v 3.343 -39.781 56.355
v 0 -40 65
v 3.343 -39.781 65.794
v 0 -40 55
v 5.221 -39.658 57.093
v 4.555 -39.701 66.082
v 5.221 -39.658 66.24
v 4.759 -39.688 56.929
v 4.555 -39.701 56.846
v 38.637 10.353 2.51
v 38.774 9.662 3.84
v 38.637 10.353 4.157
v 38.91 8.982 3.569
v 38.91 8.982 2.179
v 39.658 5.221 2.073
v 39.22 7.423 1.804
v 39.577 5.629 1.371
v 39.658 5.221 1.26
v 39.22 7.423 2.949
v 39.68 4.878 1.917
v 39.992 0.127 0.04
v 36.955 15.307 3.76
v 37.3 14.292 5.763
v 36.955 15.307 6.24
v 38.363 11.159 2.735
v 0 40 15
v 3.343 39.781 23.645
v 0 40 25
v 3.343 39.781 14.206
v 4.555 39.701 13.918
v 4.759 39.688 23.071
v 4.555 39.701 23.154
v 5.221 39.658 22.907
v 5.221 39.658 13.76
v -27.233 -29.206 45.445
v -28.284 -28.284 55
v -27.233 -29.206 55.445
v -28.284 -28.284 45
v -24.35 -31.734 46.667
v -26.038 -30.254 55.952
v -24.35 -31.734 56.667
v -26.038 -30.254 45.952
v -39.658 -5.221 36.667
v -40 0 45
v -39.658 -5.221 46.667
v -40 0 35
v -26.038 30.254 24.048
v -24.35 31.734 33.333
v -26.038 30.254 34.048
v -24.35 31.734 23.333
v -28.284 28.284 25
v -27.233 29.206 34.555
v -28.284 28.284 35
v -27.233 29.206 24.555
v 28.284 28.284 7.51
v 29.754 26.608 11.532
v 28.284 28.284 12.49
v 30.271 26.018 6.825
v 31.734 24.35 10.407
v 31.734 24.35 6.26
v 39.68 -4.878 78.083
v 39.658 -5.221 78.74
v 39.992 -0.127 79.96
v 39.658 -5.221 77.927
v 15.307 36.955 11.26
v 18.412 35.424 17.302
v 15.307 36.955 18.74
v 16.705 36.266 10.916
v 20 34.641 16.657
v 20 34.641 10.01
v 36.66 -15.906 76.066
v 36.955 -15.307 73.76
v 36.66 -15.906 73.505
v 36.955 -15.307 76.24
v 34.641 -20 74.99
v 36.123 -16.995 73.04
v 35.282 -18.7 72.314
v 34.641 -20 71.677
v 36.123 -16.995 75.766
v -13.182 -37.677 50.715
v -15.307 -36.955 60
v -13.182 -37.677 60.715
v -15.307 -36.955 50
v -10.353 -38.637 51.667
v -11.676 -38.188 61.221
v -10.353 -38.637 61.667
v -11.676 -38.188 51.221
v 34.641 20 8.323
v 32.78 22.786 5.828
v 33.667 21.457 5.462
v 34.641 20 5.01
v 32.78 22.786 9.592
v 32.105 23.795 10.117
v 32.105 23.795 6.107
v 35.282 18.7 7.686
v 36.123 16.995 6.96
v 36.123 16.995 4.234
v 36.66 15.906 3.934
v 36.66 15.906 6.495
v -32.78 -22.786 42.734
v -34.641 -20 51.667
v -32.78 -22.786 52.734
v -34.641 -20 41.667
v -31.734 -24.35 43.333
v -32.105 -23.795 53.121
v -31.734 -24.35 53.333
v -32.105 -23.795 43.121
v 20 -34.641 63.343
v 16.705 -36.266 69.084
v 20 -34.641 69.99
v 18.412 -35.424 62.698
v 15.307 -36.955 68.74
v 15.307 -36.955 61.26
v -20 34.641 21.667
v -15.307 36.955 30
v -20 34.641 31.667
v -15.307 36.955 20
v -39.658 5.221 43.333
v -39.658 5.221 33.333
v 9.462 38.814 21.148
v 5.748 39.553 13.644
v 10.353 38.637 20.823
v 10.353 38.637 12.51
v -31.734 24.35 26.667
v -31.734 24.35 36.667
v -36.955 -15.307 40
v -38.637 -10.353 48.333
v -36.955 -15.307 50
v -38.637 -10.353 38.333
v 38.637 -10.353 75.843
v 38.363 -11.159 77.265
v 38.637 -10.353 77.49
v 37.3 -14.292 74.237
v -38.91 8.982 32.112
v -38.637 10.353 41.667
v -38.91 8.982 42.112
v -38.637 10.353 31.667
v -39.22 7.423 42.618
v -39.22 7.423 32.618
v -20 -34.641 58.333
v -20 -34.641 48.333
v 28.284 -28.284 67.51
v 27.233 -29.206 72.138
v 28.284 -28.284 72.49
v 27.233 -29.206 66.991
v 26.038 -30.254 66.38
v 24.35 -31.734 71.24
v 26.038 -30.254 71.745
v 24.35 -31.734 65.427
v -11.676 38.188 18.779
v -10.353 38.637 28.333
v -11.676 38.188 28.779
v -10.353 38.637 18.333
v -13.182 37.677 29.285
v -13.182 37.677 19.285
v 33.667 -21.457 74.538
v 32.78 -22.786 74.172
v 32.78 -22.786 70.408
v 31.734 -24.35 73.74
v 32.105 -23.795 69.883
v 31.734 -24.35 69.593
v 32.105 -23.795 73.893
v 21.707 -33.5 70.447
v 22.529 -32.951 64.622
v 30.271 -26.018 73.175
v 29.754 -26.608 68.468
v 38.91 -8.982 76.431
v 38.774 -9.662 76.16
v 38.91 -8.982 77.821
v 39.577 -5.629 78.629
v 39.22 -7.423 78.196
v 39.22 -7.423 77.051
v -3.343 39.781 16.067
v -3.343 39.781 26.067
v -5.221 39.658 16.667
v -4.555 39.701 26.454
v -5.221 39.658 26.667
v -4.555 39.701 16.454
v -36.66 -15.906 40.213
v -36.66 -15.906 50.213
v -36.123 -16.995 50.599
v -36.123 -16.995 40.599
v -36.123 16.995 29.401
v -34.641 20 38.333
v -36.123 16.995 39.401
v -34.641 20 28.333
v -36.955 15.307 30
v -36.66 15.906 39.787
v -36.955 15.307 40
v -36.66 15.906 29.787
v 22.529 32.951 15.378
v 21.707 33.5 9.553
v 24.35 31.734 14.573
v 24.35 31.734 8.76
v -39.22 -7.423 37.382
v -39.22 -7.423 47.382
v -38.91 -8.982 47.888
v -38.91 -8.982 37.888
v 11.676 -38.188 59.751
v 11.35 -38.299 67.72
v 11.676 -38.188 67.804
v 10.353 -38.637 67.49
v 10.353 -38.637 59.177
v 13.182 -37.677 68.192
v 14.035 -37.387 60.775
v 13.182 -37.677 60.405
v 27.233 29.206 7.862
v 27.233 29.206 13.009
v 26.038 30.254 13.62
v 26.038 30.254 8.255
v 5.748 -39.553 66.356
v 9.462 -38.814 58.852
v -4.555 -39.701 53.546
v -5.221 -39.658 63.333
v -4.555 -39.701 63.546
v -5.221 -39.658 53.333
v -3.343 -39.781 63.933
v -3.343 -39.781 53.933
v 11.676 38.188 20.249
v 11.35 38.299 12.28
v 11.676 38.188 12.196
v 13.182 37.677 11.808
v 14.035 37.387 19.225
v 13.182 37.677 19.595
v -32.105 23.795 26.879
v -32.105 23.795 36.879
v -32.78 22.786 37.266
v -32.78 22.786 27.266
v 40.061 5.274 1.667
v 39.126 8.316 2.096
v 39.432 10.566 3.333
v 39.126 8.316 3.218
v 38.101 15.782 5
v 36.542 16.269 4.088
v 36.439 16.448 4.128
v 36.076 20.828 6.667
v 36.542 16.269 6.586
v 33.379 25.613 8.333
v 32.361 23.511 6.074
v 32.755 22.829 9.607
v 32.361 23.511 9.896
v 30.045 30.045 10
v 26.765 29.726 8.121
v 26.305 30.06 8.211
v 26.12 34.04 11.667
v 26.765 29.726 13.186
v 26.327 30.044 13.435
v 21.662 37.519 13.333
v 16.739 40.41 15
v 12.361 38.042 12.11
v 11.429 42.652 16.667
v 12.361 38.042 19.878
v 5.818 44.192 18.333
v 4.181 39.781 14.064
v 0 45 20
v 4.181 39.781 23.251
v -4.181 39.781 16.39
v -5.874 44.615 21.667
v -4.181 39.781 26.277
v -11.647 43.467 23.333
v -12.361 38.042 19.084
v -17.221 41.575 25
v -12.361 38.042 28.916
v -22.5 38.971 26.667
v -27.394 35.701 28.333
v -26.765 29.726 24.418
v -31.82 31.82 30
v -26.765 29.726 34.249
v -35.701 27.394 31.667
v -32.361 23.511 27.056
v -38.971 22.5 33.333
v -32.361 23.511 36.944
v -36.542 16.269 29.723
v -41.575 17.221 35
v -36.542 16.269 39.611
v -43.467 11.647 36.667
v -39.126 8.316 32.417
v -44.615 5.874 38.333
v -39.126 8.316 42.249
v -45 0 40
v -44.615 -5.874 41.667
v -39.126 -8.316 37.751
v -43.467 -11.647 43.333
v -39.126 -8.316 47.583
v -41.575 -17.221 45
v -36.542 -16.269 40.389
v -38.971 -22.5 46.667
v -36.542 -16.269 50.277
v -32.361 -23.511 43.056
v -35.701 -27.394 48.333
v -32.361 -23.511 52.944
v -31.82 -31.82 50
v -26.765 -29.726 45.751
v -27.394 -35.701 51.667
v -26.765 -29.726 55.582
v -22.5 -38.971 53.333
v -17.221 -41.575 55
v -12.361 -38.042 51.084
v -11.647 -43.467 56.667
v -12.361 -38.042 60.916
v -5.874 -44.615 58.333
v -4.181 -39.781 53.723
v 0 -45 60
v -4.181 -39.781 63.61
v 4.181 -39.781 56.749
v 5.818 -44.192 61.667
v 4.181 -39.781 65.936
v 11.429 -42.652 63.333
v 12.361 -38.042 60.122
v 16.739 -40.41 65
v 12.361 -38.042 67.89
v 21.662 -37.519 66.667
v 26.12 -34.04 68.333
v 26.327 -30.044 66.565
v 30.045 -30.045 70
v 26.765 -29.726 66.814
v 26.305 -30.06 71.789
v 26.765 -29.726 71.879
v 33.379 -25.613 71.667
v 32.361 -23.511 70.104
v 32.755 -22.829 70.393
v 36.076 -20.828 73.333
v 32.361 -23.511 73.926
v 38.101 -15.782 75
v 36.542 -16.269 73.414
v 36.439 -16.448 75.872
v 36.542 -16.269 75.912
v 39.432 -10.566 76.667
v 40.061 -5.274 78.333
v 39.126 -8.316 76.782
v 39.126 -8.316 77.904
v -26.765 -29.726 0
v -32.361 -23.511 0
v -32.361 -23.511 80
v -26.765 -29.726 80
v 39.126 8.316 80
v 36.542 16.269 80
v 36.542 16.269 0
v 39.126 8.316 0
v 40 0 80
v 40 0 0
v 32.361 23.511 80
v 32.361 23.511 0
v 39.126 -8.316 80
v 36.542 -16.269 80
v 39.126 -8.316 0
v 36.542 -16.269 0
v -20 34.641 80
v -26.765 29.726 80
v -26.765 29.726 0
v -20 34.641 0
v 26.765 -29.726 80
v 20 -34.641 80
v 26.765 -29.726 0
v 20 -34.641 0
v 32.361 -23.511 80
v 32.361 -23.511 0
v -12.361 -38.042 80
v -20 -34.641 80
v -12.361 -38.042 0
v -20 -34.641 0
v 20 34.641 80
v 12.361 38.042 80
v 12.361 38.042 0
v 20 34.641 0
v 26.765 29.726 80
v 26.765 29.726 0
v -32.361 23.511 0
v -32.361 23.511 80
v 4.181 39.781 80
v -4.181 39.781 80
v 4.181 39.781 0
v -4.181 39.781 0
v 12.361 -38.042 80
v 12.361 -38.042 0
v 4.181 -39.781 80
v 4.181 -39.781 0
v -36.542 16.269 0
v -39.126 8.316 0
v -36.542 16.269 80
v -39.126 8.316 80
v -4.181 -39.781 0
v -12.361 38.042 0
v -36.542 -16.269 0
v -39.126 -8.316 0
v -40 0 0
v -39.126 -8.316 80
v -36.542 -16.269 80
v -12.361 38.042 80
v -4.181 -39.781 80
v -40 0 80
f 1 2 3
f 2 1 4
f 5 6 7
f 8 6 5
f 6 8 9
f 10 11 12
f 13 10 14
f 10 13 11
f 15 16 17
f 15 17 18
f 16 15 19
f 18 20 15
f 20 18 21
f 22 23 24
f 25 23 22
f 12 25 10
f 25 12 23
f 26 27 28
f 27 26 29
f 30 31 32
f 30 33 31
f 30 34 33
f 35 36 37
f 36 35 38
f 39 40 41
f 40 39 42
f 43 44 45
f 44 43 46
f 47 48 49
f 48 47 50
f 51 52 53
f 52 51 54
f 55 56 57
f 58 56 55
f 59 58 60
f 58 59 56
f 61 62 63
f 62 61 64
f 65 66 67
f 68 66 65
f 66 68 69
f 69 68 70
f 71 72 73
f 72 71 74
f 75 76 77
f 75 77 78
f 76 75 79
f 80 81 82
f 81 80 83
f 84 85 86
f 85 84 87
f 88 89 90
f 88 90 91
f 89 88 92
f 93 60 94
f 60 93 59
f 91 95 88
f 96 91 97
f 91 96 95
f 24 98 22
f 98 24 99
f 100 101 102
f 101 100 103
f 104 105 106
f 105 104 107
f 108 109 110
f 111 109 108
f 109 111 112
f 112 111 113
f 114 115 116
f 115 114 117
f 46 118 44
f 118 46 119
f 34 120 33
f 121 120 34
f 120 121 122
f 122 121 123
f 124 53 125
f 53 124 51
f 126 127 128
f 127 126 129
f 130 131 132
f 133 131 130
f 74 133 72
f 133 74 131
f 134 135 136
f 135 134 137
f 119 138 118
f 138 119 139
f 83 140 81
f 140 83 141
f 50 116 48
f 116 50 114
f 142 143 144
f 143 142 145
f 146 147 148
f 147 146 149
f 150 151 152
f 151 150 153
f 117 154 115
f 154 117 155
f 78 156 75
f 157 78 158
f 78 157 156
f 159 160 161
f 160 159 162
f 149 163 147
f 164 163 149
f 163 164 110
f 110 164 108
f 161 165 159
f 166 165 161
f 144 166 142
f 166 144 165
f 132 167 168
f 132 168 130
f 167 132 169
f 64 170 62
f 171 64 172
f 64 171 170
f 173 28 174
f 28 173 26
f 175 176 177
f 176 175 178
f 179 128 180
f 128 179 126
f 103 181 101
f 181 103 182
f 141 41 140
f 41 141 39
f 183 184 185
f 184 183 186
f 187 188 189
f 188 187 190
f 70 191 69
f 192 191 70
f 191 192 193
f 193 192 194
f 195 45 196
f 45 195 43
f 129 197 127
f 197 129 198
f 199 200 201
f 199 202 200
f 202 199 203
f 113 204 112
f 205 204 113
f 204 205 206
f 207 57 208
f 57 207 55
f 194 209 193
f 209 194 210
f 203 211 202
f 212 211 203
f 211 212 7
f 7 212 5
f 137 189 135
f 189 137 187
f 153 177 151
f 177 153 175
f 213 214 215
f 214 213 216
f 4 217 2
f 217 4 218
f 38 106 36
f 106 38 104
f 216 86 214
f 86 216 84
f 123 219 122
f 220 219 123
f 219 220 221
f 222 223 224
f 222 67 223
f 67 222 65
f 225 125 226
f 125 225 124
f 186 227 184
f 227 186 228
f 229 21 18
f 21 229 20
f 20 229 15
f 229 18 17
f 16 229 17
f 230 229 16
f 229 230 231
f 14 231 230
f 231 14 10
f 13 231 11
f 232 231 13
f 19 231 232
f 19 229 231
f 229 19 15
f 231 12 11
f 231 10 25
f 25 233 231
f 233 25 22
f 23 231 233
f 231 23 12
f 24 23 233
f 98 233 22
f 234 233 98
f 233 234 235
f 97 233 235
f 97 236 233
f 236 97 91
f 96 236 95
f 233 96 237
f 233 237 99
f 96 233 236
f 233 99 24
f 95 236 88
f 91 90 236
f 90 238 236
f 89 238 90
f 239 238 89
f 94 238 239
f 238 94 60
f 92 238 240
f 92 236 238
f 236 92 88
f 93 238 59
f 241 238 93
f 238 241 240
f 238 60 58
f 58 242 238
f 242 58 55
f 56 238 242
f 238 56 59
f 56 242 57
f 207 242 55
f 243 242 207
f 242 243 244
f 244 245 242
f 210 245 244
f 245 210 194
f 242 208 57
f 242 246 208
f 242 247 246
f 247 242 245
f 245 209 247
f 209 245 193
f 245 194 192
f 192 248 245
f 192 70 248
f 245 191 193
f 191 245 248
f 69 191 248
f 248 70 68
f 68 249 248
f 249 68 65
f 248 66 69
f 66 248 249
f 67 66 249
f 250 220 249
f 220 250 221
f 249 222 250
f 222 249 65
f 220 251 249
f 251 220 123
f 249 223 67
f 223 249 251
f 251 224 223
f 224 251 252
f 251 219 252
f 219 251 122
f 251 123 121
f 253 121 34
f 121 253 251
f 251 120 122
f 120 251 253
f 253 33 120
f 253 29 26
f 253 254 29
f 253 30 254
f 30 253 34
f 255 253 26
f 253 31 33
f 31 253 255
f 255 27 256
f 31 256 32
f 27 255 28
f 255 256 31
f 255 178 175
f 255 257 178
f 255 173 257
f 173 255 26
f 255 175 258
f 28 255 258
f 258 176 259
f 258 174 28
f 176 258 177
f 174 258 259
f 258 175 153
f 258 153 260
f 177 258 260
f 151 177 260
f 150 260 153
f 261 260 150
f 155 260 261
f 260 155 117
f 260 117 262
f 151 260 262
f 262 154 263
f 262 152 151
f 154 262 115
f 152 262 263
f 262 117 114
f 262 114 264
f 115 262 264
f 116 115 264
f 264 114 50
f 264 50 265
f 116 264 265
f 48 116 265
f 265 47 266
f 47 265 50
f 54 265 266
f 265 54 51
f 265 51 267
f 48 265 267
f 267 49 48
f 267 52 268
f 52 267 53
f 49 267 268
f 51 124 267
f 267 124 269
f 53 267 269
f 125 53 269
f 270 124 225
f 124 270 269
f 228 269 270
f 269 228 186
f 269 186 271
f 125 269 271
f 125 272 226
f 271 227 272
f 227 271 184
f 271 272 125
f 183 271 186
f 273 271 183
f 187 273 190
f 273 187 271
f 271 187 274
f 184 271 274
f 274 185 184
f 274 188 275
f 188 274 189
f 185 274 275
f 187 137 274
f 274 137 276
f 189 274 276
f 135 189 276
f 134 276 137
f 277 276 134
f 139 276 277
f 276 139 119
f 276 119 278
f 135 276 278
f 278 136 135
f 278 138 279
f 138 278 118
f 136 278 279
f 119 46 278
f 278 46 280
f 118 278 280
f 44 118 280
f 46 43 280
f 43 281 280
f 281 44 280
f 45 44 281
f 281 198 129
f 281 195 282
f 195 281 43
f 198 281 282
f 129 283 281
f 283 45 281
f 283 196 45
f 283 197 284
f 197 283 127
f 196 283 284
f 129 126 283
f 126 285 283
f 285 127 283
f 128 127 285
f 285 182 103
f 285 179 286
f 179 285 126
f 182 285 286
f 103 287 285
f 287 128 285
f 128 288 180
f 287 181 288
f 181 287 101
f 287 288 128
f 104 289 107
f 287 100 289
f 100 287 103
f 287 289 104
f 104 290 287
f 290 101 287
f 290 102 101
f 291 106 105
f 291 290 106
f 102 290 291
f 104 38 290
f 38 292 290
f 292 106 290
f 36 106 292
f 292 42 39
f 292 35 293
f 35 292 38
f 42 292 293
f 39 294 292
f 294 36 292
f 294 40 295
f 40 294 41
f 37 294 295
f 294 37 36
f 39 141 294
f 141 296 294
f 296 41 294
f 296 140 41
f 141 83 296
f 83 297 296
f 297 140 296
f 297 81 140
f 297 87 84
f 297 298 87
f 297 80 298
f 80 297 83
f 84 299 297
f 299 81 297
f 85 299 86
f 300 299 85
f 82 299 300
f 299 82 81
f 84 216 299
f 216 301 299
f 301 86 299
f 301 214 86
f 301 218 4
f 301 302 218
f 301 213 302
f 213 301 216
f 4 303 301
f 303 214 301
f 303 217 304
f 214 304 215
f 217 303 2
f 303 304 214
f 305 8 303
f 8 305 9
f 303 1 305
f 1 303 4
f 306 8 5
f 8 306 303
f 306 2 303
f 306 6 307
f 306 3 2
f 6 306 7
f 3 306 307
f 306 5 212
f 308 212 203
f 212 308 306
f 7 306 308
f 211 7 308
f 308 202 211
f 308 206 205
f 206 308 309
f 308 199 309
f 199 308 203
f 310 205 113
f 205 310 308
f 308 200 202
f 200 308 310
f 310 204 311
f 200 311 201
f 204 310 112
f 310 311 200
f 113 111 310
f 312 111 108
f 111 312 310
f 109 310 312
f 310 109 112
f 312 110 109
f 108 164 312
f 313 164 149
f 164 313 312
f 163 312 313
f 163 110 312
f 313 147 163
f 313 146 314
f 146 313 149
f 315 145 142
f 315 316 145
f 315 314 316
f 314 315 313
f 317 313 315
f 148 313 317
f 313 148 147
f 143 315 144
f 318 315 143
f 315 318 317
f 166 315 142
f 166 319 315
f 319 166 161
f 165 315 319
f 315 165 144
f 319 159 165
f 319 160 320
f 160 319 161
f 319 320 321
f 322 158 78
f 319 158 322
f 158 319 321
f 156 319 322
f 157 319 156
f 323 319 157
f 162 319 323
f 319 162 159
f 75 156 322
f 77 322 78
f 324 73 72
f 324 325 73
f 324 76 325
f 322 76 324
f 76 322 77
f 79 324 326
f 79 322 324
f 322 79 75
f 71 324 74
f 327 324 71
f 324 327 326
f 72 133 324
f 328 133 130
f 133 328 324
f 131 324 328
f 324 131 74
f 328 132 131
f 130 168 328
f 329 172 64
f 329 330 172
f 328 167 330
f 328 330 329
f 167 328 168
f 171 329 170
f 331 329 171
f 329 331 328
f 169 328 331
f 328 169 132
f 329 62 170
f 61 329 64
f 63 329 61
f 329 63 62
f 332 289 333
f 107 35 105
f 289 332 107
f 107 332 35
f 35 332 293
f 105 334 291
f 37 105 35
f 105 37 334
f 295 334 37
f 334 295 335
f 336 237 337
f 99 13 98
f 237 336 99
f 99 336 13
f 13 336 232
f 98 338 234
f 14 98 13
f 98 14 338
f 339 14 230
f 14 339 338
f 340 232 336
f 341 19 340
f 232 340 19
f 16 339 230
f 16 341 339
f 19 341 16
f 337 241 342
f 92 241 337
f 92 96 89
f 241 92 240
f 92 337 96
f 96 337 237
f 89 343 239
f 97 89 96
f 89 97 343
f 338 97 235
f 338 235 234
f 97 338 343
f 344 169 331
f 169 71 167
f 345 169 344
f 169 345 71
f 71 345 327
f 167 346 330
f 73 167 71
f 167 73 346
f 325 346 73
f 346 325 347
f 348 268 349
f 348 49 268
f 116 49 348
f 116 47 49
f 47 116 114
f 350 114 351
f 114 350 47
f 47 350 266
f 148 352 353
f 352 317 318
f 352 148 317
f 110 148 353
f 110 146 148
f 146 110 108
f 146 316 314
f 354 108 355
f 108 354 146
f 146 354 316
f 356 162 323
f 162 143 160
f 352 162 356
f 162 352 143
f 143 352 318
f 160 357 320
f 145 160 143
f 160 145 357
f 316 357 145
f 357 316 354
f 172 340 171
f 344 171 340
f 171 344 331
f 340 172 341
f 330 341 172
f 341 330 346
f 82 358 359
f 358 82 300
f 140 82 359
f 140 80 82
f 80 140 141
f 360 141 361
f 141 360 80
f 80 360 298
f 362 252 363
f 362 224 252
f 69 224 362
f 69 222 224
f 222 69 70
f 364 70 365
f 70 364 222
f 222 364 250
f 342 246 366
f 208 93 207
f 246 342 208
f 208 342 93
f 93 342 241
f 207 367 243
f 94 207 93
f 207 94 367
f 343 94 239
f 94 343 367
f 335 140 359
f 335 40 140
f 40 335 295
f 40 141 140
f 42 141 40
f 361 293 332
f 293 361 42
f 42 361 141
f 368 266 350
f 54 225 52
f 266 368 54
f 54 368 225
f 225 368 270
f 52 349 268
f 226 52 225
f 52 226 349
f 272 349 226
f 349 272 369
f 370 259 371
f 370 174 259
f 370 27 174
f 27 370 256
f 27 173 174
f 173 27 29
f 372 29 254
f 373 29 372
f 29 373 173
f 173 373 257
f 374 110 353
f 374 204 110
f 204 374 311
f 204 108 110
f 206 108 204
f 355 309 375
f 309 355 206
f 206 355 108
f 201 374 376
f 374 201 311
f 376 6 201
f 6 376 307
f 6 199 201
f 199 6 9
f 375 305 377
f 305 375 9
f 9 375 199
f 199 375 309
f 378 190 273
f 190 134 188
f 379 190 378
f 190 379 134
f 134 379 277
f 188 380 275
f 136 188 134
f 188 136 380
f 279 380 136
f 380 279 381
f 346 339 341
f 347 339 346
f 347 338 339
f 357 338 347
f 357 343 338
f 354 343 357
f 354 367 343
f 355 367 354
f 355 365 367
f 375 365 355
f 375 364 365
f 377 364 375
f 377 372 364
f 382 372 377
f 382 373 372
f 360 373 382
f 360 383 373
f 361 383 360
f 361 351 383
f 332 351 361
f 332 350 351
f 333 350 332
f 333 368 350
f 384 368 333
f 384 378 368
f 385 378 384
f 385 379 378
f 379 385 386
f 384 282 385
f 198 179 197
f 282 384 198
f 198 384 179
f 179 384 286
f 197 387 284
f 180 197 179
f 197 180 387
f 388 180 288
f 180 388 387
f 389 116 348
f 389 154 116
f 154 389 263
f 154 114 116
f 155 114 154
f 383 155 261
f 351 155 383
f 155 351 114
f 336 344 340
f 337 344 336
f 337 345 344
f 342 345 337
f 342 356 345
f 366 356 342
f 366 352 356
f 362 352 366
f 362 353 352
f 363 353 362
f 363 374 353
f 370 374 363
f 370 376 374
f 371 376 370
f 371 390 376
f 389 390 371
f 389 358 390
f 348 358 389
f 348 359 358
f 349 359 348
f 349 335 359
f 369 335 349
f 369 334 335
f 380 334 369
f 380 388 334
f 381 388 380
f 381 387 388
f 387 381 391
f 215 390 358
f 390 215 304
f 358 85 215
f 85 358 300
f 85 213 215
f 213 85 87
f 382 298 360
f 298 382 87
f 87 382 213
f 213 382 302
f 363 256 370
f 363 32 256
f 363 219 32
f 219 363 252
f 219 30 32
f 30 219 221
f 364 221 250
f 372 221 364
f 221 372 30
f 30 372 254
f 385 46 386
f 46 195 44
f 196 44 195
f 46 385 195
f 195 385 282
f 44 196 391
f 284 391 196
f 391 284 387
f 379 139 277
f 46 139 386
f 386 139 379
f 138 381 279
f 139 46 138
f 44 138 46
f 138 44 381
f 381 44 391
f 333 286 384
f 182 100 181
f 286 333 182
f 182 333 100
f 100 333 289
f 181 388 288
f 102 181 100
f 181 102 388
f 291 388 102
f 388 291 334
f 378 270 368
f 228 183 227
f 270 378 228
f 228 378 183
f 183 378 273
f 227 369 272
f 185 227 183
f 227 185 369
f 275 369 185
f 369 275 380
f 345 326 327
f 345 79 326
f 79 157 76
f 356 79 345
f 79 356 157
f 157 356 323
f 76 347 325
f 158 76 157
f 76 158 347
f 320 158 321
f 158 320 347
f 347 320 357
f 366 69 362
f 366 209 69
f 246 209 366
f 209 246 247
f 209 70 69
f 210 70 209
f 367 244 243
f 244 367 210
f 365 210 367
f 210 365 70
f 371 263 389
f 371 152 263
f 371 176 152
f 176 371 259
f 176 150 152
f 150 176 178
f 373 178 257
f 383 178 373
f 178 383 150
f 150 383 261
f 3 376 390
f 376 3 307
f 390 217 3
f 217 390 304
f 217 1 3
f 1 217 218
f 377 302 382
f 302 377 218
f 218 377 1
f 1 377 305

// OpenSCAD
// Generated by SolidPython 0.4.0 on 2019-09-03 12:41:32


union() {
	render() {
		intersection() {
			polyhedron(faces = [[0, 1, 3], [1, 4, 3], [1, 2, 4], [2, 5, 4], [0, 5, 2], [0, 3, 5], [3, 4, 6], [4, 7, 6], [4, 5, 7], [5, 8, 7], [3, 8, 5], [3, 6, 8], [6, 7, 9], [7, 10, 9], [7, 8, 10], [8, 11, 10], [6, 11, 8], [6, 9, 11], [9, 10, 12], [10, 13, 12], [10, 11, 13], [11, 14, 13], [9, 14, 11], [9, 12, 14], [12, 13, 15], [13, 16, 15], [13, 14, 16], [14, 17, 16], [12, 17, 14], [12, 15, 17], [15, 16, 18], [16, 19, 18], [16, 17, 19], [17, 20, 19], [15, 20, 17], [15, 18, 20], [18, 19, 21], [19, 22, 21], [19, 20, 22], [20, 23, 22], [18, 23, 20], [18, 21, 23], [21, 22, 24], [22, 25, 24], [22, 23, 25], [23, 26, 25], [21, 26, 23], [21, 24, 26], [24, 25, 27], [25, 28, 27], [25, 26, 28], [26, 29, 28], [24, 29, 26], [24, 27, 29], [27, 28, 30], [28, 31, 30], [28, 29, 31], [29, 32, 31], [27, 32, 29], [27, 30, 32], [30, 31, 33], [31, 34, 33], [31, 32, 34], [32, 35, 34], [30, 35, 32], [30, 33, 35], [33, 34, 36], [34, 37, 36], [34, 35, 37], [35, 38, 37], [33, 38, 35], [33, 36, 38], [36, 37, 39], [37, 40, 39], [37, 38, 40], [38, 41, 40], [36, 41, 38], [36, 39, 41], [39, 40, 42], [40, 43, 42], [40, 41, 43], [41, 44, 43], [39, 44, 41], [39, 42, 44], [42, 43, 45], [43, 46, 45], [43, 44, 46], [44, 47, 46], [42, 47, 44], [42, 45, 47], [45, 46, 48], [46, 49, 48], [46, 47, 49], [47, 50, 49], [45, 50, 47], [45, 48, 50], [48, 49, 51], [49, 52, 51], [49, 50, 52], [50, 53, 52], [48, 53, 50], [48, 51, 53], [51, 52, 54], [52, 55, 54], [52, 53, 55], [53, 56, 55], [51, 56, 53], [51, 54, 56], [54, 55, 57], [55, 58, 57], [55, 56, 58], [56, 59, 58], [54, 59, 56], [54, 57, 59], [57, 58, 60], [58, 61, 60], [58, 59, 61], [59, 62, 61], [57, 62, 59], [57, 60, 62], [60, 61, 63], [61, 64, 63], [61, 62, 64], [62, 65, 64], [60, 65, 62], [60, 63, 65], [63, 64, 66], [64, 67, 66], [64, 65, 67], [65, 68, 67], [63, 68, 65], [63, 66, 68], [66, 67, 69], [67, 70, 69], [67, 68, 70], [68, 71, 70], [66, 71, 68], [66, 69, 71], [69, 70, 72], [70, 73, 72], [70, 71, 73], [71, 74, 73], [69, 74, 71], [69, 72, 74], [72, 73, 75], [73, 76, 75], [73, 74, 76], [74, 77, 76], [72, 77, 74], [72, 75, 77], [75, 76, 78], [76, 79, 78], [76, 77, 79], [77, 80, 79], [75, 80, 77], [75, 78, 80], [78, 79, 81], [79, 82, 81], [79, 80, 82], [80, 83, 82], [78, 83, 80], [78, 81, 83], [81, 82, 84], [82, 85, 84], [82, 83, 85], [83, 86, 85], [81, 86, 83], [81, 84, 86], [84, 85, 87], [85, 88, 87], [85, 86, 88], [86, 89, 88], [84, 89, 86], [84, 87, 89], [87, 88, 90], [88, 91, 90], [88, 89, 91], [89, 92, 91], [87, 92, 89], [87, 90, 92], [90, 91, 93], [91, 94, 93], [91, 92, 94], [92, 95, 94], [90, 95, 92], [90, 93, 95], [93, 94, 96], [94, 97, 96], [94, 95, 97], [95, 98, 97], [93, 98, 95], [93, 96, 98], [96, 97, 99], [97, 100, 99], [97, 98, 100], [98, 101, 100], [96, 101, 98], [96, 99, 101], [99, 100, 102], [100, 103, 102], [100, 101, 103], [101, 104, 103], [99, 104, 101], [99, 102, 104], [102, 103, 105], [103, 106, 105], [103, 104, 106], [104, 107, 106], [102, 107, 104], [102, 105, 107], [105, 106, 108], [106, 109, 108], [106, 107, 109], [107, 110, 109], [105, 110, 107], [105, 108, 110], [108, 109, 111], [109, 112, 111], [109, 110, 112], [110, 113, 112], [108, 113, 110], [108, 111, 113], [111, 112, 114], [112, 115, 114], [112, 113, 115], [113, 116, 115], [111, 116, 113], [111, 114, 116], [114, 115, 117], [115, 118, 117], [115, 116, 118], [116, 119, 118], [114, 119, 116], [114, 117, 119], [117, 118, 120], [118, 121, 120], [118, 119, 121], [119, 122, 121], [117, 122, 119], [117, 120, 122], [120, 121, 123], [121, 124, 123], [121, 122, 124], [122, 125, 124], [120, 125, 122], [120, 123, 125], [123, 124, 126], [124, 127, 126], [124, 125, 127], [125, 128, 127], [123, 128, 125], [123, 126, 128], [126, 127, 129], [127, 130, 129], [127, 128, 130], [128, 131, 130], [126, 131, 128], [126, 129, 131], [129, 130, 132], [130, 133, 132], [130, 131, 133], [131, 134, 133], [129, 134, 131], [129, 132, 134], [132, 133, 135], [133, 136, 135], [133, 134, 136], [134, 137, 136], [132, 137, 134], [132, 135, 137], [135, 136, 138], [136, 139, 138], [136, 137, 139], [137, 140, 139], [135, 140, 137], [135, 138, 140], [138, 139, 141], [139, 142, 141], [139, 140, 142], [140, 143, 142], [138, 143, 140], [138, 141, 143], [141, 142, 144], [142, 145, 144], [142, 143, 145], [143, 146, 145], [141, 146, 143], [141, 144, 146], [0, 2, 1], [144, 145, 146]], points = [[34.9900000000, 0.0000000000, -5.0000000000], [39.9900000000, 0.0000000000, 0.0000000000], [34.9900000000, 0.0000000000, 5.0000000000], [35.1037577250, 4.6214973792, -3.3333333333], [40.0609820319, 5.2741283403, 1.6666666667], [35.1037577250, 4.6214973792, 6.6666666667], [34.6026828504, 9.2717609257, -1.6666666667], [39.4323119819, 10.5658561512, 3.3333333333], [34.6026828504, 9.2717609257, 8.3333333333], [33.4813942582, 13.8684475889, 0.0000000000], [38.1007919208, 15.7818647507, 5.0000000000], [33.4813942582, 13.8684475889, 10.0000000000], [31.7456045514, 18.3283333333, 1.6666666667], [36.0757315703, 20.8283333333, 6.6666666667], [31.7456045514, 18.3283333333, 11.6666666667], [29.4122528357, 22.5688153781, 3.3333333333], [33.3790195372, 25.6126225232, 8.3333333333], [29.4122528357, 22.5688153781, 13.3333333333], [26.5094332267, 26.5094332267, 5.0000000000], [30.0449671326, 30.0449671326, 10.0000000000], [26.5094332267, 26.5094332267, 15.0000000000], [23.0761165690, 30.0733806193, 6.6666666667], [26.1199237140, 34.0401473208, 11.6666666667], [23.0761165690, 30.0733806193, 16.6666666667], [19.1616666667, 33.1889802244, 8.3333333333], [21.6616666667, 37.5191072433, 13.3333333333], [19.1616666667, 33.1889802244, 18.3333333333], [14.8251561698, 35.7910930895, 10.0000000000], [16.7385733316, 40.4104907520, 15.0000000000], [14.8251561698, 35.7910930895, 20.0000000000], [10.1344910761, 37.8224356047, 11.6666666667], [11.4285863016, 42.6520647362, 16.6666666667], [10.1344910761, 37.8224356047, 21.6666666667], [5.1653565135, 39.2347779808, 13.3333333333], [5.8179874746, 44.1920022876, 18.3333333333], [5.1653565135, 39.2347779808, 23.3333333333], [0.0000000000, 40.0000000000, 15.0000000000], [0.0000000000, 45.0000000000, 20.0000000000], [0.0000000000, 40.0000000000, 25.0000000000], [-5.2210476888, 39.6577944550, 16.6666666667], [-5.8736786499, 44.6150187618, 21.6666666667], [-5.2210476888, 39.6577944550, 26.6666666667], [-10.3527618041, 38.6370330516, 18.3333333333], [-11.6468570296, 43.4666621830, 23.3333333333], [-10.3527618041, 38.6370330516, 28.3333333333], [-15.3073372946, 36.9551813005, 20.0000000000], [-17.2207544564, 41.5745789630, 25.0000000000], [-15.3073372946, 36.9551813005, 30.0000000000], [-20.0000000000, 34.6410161514, 21.6666666667], [-22.5000000000, 38.9711431703, 26.6666666667], [-20.0000000000, 34.6410161514, 31.6666666667], [-24.3504571603, 31.7341336116, 23.3333333333], [-27.3942643054, 35.7009003131, 28.3333333333], [-24.3504571603, 31.7341336116, 33.3333333333], [-28.2842712475, 28.2842712475, 25.0000000000], [-31.8198051534, 31.8198051534, 30.0000000000], [-28.2842712475, 28.2842712475, 35.0000000000], [-31.7341336116, 24.3504571603, 26.6666666667], [-35.7009003131, 27.3942643054, 31.6666666667], [-31.7341336116, 24.3504571603, 36.6666666667], [-34.6410161514, 20.0000000000, 28.3333333333], [-38.9711431703, 22.5000000000, 33.3333333333], [-34.6410161514, 20.0000000000, 38.3333333333], [-36.9551813005, 15.3073372946, 30.0000000000], [-41.5745789630, 17.2207544564, 35.0000000000], [-36.9551813005, 15.3073372946, 40.0000000000], [-38.6370330516, 10.3527618041, 31.6666666667], [-43.4666621830, 11.6468570296, 36.6666666667], [-38.6370330516, 10.3527618041, 41.6666666667], [-39.6577944550, 5.2210476888, 33.3333333333], [-44.6150187618, 5.8736786499, 38.3333333333], [-39.6577944550, 5.2210476888, 43.3333333333], [-40.0000000000, 0.0000000000, 35.0000000000], [-45.0000000000, 0.0000000000, 40.0000000000], [-40.0000000000, 0.0000000000, 45.0000000000], [-39.6577944550, -5.2210476888, 36.6666666667], [-44.6150187618, -5.8736786499, 41.6666666667], [-39.6577944550, -5.2210476888, 46.6666666667], [-38.6370330516, -10.3527618041, 38.3333333333], [-43.4666621830, -11.6468570296, 43.3333333333], [-38.6370330516, -10.3527618041, 48.3333333333], [-36.9551813005, -15.3073372946, 40.0000000000], [-41.5745789630, -17.2207544564, 45.0000000000], [-36.9551813005, -15.3073372946, 50.0000000000], [-34.6410161514, -20.0000000000, 41.6666666667], [-38.9711431703, -22.5000000000, 46.6666666667], [-34.6410161514, -20.0000000000, 51.6666666667], [-31.7341336116, -24.3504571603, 43.3333333333], [-35.7009003131, -27.3942643054, 48.3333333333], [-31.7341336116, -24.3504571603, 53.3333333333], [-28.2842712475, -28.2842712475, 45.0000000000], [-31.8198051534, -31.8198051534, 50.0000000000], [-28.2842712475, -28.2842712475, 55.0000000000], [-24.3504571603, -31.7341336116, 46.6666666667], [-27.3942643054, -35.7009003131, 51.6666666667], [-24.3504571603, -31.7341336116, 56.6666666667], [-20.0000000000, -34.6410161514, 48.3333333333], [-22.5000000000, -38.9711431703, 53.3333333333], [-20.0000000000, -34.6410161514, 58.3333333333], [-15.3073372946, -36.9551813005, 50.0000000000], [-17.2207544564, -41.5745789630, 55.0000000000], [-15.3073372946, -36.9551813005, 60.0000000000], [-10.3527618041, -38.6370330516, 51.6666666667], [-11.6468570296, -43.4666621830, 56.6666666667], [-10.3527618041, -38.6370330516, 61.6666666667], [-5.2210476888, -39.6577944550, 53.3333333333], [-5.8736786499, -44.6150187618, 58.3333333333], [-5.2210476888, -39.6577944550, 63.3333333333], [-0.0000000000, -40.0000000000, 55.0000000000], [-0.0000000000, -45.0000000000, 60.0000000000], [-0.0000000000, -40.0000000000, 65.0000000000], [5.1653565135, -39.2347779808, 56.6666666667], [5.8179874746, -44.1920022876, 61.6666666667], [5.1653565135, -39.2347779808, 66.6666666667], [10.1344910761, -37.8224356047, 58.3333333333], [11.4285863016, -42.6520647362, 63.3333333333], [10.1344910761, -37.8224356047, 68.3333333333], [14.8251561698, -35.7910930895, 60.0000000000], [16.7385733316, -40.4104907520, 65.0000000000], [14.8251561698, -35.7910930895, 70.0000000000], [19.1616666667, -33.1889802244, 61.6666666667], [21.6616666667, -37.5191072433, 66.6666666667], [19.1616666667, -33.1889802244, 71.6666666667], [23.0761165690, -30.0733806193, 63.3333333333], [26.1199237140, -34.0401473208, 68.3333333333], [23.0761165690, -30.0733806193, 73.3333333333], [26.5094332267, -26.5094332267, 65.0000000000], [30.0449671326, -30.0449671326, 70.0000000000], [26.5094332267, -26.5094332267, 75.0000000000], [29.4122528357, -22.5688153781, 66.6666666667], [33.3790195372, -25.6126225232, 71.6666666667], [29.4122528357, -22.5688153781, 76.6666666667], [31.7456045514, -18.3283333333, 68.3333333333], [36.0757315703, -20.8283333333, 73.3333333333], [31.7456045514, -18.3283333333, 78.3333333333], [33.4813942582, -13.8684475889, 70.0000000000], [38.1007919208, -15.7818647507, 75.0000000000], [33.4813942582, -13.8684475889, 80.0000000000], [34.6026828504, -9.2717609257, 71.6666666667], [39.4323119819, -10.5658561512, 76.6666666667], [34.6026828504, -9.2717609257, 81.6666666667], [35.1037577250, -4.6214973792, 73.3333333333], [40.0609820319, -5.2741283403, 78.3333333333], [35.1037577250, -4.6214973792, 83.3333333333], [34.9900000000, -0.0000000000, 75.0000000000], [39.9900000000, -0.0000000000, 80.0000000000], [34.9900000000, -0.0000000000, 85.0000000000]]);
			difference() {
				cylinder($fn = 48, h = 80, r = 45.0100000000);
				cylinder($fn = 48, h = 80, r = 40);
			}
		}
	}
	cylinder(h = 80, r = 40);
}
/***********************************************
*********      SolidPython code:      **********
************************************************
 
#! /usr/bin/env python
# -*- coding: utf-8 -*-
from __future__ import division
import os
import sys

from solid import *
from solid.utils import *
from solid import screw_thread

SEGMENTS = 48

inner_rad = 40
screw_height = 80


def assembly():
    section = screw_thread.default_thread_section(tooth_height=10, tooth_depth=5)
    s = screw_thread.thread(outline_pts=section, 
                            inner_rad=inner_rad,
                            pitch=screw_height, 
                            length=screw_height, 
                            segments_per_rot=SEGMENTS, 
                            neck_in_degrees=90, 
                            neck_out_degrees=90)

    c = cylinder(r=inner_rad, h=screw_height)
    return s + c

if __name__ == '__main__':
    out_dir = sys.argv[1] if len(sys.argv) > 1 else os.curdir
    file_out = os.path.join(out_dir, 'screw_thread_example.scad')

    a = assembly()

    print("%(__file__)s: SCAD file written to: \n%(file_out)s" % vars())

    scad_render_to_file(a, file_out, include_orig_code=True)
 
 
************************************************/
